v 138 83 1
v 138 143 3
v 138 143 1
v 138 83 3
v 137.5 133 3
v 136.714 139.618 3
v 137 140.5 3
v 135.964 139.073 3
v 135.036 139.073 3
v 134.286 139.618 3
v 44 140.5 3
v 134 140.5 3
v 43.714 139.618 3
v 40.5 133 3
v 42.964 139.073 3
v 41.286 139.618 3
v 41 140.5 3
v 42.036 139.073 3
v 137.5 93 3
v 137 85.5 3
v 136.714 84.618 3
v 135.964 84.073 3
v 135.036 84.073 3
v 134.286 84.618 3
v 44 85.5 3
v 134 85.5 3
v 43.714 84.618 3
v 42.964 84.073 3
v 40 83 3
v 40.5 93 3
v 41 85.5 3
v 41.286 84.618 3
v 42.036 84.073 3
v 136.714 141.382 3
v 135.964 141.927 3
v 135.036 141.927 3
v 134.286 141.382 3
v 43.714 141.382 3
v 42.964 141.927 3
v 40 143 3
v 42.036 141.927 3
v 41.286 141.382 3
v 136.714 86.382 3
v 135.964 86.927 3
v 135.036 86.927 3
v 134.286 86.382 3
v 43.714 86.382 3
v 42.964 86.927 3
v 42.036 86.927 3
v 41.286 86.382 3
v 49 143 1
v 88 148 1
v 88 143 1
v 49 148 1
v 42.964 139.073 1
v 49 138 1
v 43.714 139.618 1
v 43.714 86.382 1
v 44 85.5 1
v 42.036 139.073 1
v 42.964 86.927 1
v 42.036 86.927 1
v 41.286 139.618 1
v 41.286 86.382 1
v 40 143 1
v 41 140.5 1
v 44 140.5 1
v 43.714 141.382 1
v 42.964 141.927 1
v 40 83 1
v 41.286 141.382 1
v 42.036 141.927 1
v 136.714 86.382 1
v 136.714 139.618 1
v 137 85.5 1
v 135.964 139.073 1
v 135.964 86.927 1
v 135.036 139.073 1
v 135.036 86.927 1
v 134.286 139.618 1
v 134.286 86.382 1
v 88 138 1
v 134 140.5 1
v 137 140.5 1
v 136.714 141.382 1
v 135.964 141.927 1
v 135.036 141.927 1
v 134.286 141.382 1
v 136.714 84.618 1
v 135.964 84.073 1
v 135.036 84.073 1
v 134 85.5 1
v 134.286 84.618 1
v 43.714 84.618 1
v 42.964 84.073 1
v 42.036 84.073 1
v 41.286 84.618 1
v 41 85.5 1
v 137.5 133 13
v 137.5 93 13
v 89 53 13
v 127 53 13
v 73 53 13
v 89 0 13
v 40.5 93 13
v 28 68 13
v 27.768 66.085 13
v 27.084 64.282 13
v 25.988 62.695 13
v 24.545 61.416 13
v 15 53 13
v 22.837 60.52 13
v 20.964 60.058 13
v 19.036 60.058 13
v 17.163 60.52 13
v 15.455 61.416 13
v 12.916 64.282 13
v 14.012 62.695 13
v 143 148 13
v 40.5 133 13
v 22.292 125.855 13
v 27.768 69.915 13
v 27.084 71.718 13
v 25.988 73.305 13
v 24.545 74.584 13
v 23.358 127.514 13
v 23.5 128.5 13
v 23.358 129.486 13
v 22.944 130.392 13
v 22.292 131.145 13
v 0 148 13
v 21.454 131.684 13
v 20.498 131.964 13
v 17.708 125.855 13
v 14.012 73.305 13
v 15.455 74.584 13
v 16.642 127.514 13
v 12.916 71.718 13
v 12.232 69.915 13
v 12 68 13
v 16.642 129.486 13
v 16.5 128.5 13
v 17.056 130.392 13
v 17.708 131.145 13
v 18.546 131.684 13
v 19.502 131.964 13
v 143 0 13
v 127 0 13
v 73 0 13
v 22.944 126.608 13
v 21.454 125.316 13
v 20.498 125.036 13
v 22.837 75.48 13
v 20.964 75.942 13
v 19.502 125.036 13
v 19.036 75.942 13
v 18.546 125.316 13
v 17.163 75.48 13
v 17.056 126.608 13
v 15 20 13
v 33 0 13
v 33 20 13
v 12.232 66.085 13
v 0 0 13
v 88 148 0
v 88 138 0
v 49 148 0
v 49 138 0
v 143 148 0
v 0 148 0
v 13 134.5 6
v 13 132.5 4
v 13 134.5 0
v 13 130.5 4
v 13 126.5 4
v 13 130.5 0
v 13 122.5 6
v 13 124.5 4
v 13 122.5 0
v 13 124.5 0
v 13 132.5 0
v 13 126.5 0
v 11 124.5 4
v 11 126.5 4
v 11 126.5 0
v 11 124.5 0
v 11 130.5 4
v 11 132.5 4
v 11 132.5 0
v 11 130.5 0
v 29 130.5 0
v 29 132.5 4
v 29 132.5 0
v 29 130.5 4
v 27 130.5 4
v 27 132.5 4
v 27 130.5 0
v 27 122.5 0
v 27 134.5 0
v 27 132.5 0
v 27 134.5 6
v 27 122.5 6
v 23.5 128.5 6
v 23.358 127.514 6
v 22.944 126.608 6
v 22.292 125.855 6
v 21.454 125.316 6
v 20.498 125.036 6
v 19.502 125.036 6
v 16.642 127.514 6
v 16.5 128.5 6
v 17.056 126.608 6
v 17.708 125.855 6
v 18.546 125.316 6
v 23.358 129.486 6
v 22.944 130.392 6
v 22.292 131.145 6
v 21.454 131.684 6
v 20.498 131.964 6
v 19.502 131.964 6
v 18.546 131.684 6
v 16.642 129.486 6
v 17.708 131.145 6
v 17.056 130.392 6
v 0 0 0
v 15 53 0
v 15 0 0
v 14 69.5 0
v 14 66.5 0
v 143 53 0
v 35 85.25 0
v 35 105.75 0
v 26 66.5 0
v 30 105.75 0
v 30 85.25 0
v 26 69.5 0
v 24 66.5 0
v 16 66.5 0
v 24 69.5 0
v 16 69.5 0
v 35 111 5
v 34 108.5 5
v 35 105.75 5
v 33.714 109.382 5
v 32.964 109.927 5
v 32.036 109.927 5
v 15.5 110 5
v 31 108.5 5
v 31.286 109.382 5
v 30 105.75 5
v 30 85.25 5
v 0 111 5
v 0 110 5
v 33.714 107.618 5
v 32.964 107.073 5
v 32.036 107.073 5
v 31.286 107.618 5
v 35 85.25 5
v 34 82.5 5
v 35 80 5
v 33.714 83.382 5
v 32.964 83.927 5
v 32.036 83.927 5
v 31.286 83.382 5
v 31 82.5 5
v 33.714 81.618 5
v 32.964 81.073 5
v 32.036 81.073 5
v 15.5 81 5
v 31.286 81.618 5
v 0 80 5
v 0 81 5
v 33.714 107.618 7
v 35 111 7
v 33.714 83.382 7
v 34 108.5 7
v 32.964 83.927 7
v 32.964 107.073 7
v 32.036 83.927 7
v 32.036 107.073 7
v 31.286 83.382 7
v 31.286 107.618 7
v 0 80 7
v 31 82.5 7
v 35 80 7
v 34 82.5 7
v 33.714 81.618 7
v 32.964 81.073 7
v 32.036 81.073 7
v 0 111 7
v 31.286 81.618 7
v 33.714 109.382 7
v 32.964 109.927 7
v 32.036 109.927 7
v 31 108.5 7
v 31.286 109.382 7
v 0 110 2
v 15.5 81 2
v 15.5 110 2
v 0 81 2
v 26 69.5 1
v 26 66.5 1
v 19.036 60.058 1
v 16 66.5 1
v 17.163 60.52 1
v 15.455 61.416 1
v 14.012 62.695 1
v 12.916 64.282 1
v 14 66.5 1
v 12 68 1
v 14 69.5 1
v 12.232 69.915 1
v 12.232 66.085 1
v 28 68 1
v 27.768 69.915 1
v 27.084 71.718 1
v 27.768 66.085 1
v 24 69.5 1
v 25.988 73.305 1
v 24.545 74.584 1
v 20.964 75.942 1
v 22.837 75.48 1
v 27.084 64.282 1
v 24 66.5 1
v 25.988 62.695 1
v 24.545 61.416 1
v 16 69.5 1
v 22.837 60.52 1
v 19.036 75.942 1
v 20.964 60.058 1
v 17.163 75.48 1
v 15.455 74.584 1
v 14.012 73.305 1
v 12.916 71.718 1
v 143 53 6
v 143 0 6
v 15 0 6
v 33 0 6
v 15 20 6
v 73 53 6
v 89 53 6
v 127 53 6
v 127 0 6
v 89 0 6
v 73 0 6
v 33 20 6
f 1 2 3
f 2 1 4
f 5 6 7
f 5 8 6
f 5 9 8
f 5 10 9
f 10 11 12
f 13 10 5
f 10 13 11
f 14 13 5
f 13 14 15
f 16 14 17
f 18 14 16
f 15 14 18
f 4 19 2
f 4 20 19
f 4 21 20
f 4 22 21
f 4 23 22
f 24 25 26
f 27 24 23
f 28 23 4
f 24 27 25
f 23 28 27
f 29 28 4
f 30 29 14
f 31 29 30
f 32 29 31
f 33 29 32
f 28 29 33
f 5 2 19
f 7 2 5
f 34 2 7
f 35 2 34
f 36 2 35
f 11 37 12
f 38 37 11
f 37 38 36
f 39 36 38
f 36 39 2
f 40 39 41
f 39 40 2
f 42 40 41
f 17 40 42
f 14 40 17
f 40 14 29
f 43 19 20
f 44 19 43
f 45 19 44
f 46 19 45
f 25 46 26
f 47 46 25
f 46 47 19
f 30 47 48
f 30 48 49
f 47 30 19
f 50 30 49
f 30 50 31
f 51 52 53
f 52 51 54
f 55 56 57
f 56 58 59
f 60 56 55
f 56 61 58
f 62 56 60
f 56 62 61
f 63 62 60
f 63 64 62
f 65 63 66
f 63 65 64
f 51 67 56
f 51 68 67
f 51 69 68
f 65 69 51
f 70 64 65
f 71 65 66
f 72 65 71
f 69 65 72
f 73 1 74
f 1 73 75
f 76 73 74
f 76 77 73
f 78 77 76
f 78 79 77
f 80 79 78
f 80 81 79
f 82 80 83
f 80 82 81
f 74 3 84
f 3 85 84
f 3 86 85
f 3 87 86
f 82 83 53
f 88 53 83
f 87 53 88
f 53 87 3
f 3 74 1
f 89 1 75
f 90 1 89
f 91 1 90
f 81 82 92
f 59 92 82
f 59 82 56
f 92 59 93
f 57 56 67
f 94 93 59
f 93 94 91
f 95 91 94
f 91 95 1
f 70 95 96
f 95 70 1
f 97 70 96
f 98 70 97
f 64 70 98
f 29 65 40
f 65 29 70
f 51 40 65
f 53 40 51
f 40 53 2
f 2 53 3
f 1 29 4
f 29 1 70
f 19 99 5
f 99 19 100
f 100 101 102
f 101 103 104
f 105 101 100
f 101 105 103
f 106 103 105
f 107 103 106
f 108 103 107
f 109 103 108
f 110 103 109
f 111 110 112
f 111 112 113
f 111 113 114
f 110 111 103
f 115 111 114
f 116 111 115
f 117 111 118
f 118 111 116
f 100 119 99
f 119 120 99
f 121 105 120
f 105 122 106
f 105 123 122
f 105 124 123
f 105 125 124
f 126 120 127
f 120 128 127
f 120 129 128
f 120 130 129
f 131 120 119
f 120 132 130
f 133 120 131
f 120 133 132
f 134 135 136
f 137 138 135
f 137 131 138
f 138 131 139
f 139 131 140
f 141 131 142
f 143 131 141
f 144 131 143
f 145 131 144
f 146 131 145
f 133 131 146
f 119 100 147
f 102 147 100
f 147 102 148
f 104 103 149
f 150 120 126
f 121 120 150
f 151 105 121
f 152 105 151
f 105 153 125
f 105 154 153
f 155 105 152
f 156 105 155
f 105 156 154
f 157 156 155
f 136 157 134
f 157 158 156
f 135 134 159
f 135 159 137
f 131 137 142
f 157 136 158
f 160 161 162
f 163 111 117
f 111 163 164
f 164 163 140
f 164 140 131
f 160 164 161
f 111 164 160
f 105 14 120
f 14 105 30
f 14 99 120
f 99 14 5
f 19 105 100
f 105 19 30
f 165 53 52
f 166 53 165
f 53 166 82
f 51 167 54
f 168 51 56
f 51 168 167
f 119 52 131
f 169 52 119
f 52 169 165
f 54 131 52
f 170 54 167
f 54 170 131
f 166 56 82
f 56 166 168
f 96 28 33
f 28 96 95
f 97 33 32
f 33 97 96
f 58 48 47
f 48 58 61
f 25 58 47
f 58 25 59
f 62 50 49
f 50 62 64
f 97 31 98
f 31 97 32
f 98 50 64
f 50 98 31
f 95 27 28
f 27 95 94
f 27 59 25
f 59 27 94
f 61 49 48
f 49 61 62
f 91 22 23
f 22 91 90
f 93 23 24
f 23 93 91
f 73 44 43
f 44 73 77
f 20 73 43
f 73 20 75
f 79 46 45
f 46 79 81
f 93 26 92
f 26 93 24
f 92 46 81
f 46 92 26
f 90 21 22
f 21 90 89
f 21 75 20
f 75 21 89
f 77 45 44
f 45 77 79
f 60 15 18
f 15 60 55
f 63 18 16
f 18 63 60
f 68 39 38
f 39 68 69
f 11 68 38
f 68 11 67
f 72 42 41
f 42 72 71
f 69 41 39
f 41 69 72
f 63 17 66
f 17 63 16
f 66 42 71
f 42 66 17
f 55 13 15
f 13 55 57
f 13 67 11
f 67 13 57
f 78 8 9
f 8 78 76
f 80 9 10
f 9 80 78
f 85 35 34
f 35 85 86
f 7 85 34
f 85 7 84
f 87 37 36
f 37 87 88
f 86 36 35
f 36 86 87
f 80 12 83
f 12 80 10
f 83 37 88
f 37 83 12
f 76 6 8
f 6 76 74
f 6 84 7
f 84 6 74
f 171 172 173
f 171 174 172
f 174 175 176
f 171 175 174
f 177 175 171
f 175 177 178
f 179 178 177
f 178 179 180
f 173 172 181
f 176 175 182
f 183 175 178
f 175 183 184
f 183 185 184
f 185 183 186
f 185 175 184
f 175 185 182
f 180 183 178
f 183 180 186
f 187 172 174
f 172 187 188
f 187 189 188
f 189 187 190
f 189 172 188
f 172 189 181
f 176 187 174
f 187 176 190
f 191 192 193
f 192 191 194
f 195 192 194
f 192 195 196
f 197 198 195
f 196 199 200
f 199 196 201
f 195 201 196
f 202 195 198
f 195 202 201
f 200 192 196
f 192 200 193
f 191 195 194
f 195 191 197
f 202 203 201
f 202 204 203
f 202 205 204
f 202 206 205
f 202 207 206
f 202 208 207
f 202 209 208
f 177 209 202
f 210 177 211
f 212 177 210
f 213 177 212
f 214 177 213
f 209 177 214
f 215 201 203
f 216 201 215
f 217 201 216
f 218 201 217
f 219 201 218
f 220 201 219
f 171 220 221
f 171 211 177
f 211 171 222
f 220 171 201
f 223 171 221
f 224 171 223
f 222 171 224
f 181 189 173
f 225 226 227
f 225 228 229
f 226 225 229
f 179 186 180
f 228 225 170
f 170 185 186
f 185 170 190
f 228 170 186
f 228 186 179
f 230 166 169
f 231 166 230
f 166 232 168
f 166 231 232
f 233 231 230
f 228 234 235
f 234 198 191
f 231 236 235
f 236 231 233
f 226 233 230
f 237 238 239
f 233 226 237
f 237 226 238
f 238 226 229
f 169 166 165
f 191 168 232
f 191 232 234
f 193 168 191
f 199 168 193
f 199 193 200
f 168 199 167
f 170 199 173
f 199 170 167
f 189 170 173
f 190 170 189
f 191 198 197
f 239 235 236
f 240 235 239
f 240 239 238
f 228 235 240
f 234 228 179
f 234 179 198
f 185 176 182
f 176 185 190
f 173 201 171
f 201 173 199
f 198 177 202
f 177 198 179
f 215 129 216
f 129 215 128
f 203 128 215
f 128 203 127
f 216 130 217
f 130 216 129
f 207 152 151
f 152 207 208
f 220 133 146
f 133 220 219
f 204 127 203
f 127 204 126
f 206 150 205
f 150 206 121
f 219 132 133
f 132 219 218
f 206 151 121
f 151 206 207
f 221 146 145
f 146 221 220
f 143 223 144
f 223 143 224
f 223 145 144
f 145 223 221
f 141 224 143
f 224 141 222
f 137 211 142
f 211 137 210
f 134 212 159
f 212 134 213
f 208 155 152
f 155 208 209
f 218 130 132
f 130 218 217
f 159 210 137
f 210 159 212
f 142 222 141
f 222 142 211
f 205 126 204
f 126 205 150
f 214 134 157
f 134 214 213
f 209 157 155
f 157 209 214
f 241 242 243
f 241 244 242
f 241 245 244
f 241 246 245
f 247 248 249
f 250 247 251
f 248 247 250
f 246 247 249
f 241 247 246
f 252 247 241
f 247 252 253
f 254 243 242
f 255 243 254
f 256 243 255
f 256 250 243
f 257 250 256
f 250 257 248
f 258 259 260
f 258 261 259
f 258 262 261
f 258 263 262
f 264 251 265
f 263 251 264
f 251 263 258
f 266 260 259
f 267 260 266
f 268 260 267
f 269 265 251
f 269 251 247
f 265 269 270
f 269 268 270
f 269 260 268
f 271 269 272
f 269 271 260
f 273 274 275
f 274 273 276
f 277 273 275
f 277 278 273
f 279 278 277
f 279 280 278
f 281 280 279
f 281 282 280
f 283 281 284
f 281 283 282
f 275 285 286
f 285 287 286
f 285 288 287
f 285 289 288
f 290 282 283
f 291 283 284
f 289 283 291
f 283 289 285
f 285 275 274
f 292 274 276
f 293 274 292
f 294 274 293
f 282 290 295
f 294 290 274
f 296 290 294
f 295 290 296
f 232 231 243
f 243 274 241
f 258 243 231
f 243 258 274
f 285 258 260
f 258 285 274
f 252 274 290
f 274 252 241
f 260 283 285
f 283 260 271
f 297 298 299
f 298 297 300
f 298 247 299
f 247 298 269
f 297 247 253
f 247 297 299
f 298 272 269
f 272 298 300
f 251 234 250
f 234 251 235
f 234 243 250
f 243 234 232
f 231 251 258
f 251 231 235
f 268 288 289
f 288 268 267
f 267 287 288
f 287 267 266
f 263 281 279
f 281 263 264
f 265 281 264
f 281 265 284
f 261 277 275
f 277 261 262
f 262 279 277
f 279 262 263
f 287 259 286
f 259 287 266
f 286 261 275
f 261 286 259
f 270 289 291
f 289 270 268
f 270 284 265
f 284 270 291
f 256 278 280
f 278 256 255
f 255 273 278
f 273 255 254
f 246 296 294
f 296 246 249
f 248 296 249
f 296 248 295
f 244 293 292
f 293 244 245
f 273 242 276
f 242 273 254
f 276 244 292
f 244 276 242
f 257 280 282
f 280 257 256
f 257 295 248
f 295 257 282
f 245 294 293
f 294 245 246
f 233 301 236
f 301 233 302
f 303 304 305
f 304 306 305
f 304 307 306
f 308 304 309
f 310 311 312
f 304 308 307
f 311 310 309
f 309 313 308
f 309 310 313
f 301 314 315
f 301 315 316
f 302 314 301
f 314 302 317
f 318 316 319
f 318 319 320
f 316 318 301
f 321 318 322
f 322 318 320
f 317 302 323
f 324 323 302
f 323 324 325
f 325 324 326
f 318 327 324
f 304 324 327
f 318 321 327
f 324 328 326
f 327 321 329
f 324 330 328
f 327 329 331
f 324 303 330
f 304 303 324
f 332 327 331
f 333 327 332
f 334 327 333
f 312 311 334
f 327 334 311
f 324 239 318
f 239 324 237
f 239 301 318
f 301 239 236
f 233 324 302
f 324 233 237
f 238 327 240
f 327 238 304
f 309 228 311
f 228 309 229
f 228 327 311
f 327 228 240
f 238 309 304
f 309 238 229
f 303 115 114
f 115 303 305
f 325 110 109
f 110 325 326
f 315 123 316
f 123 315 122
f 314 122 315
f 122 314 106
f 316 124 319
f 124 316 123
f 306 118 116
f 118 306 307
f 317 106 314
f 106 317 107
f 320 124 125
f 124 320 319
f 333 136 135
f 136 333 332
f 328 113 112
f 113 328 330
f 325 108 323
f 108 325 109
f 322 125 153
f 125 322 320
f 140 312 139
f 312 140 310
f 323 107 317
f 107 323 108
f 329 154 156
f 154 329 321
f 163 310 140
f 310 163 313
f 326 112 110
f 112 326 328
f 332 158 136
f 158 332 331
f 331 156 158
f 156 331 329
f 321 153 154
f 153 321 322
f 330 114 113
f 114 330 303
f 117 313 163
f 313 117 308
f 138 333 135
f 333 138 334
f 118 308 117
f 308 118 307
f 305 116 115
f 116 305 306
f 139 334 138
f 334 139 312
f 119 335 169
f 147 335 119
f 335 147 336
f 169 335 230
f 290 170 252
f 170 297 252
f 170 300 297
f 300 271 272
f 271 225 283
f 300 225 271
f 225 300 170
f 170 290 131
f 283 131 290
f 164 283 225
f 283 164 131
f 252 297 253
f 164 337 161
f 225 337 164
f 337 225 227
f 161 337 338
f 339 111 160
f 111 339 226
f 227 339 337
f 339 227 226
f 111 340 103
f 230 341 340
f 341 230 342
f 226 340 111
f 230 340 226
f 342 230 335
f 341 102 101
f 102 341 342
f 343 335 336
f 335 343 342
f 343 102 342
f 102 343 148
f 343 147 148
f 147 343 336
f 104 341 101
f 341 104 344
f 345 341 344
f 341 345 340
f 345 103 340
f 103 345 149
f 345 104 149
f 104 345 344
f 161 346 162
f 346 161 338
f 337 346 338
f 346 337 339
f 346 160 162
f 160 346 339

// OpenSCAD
// file: sdcard_reader.scad
module sdCardReader()
{
  difference()
  {
    union()
    {
      // main board
      cube([45,31,2]);
      // card connector
      translate([45-29+3.5, (31-29)/2, 2])
        cube([29,29,3]);
      // connectors
      translate([0, (31-20.5)/2, 2])
        cube([5, 20.5, 8]);
      // plugs
      translate([1, (31-20.5)/2, 8+2])
        cube([2, 20.5, 18]);
    }
    for(offset = [
                   [3/2+1, 3/2+1, -1],
                   [3/2+1, 31-3/2-1, -1]
                 ])
    {
      translate(offset)
        cylinder(r=3/2, h=4, $fs=1);
    }
  }
}

sdCardReader();
// file: reset_button.scad
module resetButton()
{
  cylinder(r=16/2, h=15);
  // soldering pins:
  translate([0,0,-6])
  {
    translate([-2/2+5,-3/2,0])
      cube([2,3,6]);
    translate([-2/2-5,-3/2,0])
      cube([2,3,6]);
  }
  // mounting cap
  translate([0,0,15-2])
    cylinder(r=22/2, h=2);
  // button's moving part
  translate([0,0,15])
    cylinder(r=16/2-2, h=2);
}

resetButton();
// file: menu_knob_manipulator.scad
module menuKnobManipulator()
{
  difference()
  {
    // part's body
    cylinder(r=30/2, h=10);
    // hole for encoder's sticking-out part ;)
    translate([0,0,10-6])
      cylinder(r=6/2, h=6);
  }
  // driver part 1
  translate([-(1-0.4)/2, -1/2+2.5, 10-6])
    cube([1-0.2, 1, 6]);
  // driver part 2
  translate([-(1-0.4)/2, -1/2-2.5, 10-6])
    cube([1-0.2, 1, 6]);
}

menuKnobManipulator();
// file: menu_knob.scad
module menuKnob()
{
  // main body
  cube([14,12,6]);
  // pins
  for(offset = [
                 [-2,   2,      -(12-4-4)],
                 [-2,   12-2-2, -(12-4-4)],
                 [12+2, 12-2-2, -(12-4-4)],
               ])
  {
    translate(offset)
      cube([2,2,12-4]);
  }
  // cap holder
  translate([14/2, 12/2, 6])
    cylinder(r=7/2, h=10, $fs=1);
  // push button distance
  translate([14/2, 12/2, 6+10])
    cylinder(r=(6-2*1)/2, h=1, $fs=1);
  // knob mounting
  difference()
  {
    translate([14/2, 12/2, 6+10+1])
      cylinder(r=6/2, h=6, $fs=1);
    translate([14/2-6/2, 12/2-1/2, 6+10+1+1])
      cube([6,1,5]);
  }
}

menuKnob();
// file: lcd.scad
module lcdBoard()
{
  difference()
  {
    union()
    {
      // lower plate
      cube([98,60,2]);
      // LCD itself
      translate([0.5, 10, 2])
        cube([97,40,10]);
      // cables
      translate([9, 60-5, -2])
        cube([39,10,2]);
    }
    // drills
    for(offset = [
                   [3/2+1, 3/2+1, -1],
                   [98-3/2-1, 3/2+1, -1],
                   [3/2+1, 60-3/2-1, -1],
                   [98-3/2-1, 60-3/2-1, -1]
                 ])
    {
      translate(offset)
        cylinder(r=3/2, h=4, $fs=1);
    }
  }
}

lcdBoard();
// main file
use <lcd.scad>
use <menu_knob.scad>
use <menu_knob_manipulator.scad>
use <reset_button.scad>
use <sdcard_reader.scad>


boxSize = [143, 148, 6+7];
lcdOffset = boxSize - [98+5, 60+5, 12];
encoderOffset = [20-14/2, boxSize[1]-30/2-15/2-3, boxSize[2]-(6+7)];
sdCardOffset = [35, 80, boxSize[2]-6];
resetButtonOffset = [encoderOffset[0]+14/2, 68, 1];

//rotate([180, 0, 0])
{
  difference()
  {
    // main working area
    cube(boxSize);
    // prusa's framework  corner
    translate([15, 0, 0])
      cube([143-15, 53, boxSize[2]]);
    // LCD
    translate(lcdOffset)
      lcdBoard();
    // encoder
    translate(encoderOffset)
      menuKnob();
    // SD card mount
    translate(sdCardOffset)
      rotate([0,180,0])
        sdCardReader();
    // reset button
    translate(resetButtonOffset)
      resetButton();
  }

  // main mounting legs
  for(offset = [ [boxSize[0]-16, 0, boxSize[2]-7], [boxSize[0]-70, 0, boxSize[2]-7] ])
    translate(offset)
      cube([16, 40+13, 7]);
  // side mounting wing
  translate([15, 0, 6])
    cube([18, 20, 7]);

  // LCD stub
  %translate(lcdOffset)
    lcdBoard();
  // encoder stub
  %translate(encoderOffset)
  {
    menuKnob();
    translate([7, 6, 23+4])
      rotate([180,0,0])
        menuKnobManipulator();
  }
  // SD card mount stub
  %translate(sdCardOffset)
    rotate([0,180,0])
      sdCardReader();
  // reset button stub
  %translate(resetButtonOffset)
    resetButton();
}
